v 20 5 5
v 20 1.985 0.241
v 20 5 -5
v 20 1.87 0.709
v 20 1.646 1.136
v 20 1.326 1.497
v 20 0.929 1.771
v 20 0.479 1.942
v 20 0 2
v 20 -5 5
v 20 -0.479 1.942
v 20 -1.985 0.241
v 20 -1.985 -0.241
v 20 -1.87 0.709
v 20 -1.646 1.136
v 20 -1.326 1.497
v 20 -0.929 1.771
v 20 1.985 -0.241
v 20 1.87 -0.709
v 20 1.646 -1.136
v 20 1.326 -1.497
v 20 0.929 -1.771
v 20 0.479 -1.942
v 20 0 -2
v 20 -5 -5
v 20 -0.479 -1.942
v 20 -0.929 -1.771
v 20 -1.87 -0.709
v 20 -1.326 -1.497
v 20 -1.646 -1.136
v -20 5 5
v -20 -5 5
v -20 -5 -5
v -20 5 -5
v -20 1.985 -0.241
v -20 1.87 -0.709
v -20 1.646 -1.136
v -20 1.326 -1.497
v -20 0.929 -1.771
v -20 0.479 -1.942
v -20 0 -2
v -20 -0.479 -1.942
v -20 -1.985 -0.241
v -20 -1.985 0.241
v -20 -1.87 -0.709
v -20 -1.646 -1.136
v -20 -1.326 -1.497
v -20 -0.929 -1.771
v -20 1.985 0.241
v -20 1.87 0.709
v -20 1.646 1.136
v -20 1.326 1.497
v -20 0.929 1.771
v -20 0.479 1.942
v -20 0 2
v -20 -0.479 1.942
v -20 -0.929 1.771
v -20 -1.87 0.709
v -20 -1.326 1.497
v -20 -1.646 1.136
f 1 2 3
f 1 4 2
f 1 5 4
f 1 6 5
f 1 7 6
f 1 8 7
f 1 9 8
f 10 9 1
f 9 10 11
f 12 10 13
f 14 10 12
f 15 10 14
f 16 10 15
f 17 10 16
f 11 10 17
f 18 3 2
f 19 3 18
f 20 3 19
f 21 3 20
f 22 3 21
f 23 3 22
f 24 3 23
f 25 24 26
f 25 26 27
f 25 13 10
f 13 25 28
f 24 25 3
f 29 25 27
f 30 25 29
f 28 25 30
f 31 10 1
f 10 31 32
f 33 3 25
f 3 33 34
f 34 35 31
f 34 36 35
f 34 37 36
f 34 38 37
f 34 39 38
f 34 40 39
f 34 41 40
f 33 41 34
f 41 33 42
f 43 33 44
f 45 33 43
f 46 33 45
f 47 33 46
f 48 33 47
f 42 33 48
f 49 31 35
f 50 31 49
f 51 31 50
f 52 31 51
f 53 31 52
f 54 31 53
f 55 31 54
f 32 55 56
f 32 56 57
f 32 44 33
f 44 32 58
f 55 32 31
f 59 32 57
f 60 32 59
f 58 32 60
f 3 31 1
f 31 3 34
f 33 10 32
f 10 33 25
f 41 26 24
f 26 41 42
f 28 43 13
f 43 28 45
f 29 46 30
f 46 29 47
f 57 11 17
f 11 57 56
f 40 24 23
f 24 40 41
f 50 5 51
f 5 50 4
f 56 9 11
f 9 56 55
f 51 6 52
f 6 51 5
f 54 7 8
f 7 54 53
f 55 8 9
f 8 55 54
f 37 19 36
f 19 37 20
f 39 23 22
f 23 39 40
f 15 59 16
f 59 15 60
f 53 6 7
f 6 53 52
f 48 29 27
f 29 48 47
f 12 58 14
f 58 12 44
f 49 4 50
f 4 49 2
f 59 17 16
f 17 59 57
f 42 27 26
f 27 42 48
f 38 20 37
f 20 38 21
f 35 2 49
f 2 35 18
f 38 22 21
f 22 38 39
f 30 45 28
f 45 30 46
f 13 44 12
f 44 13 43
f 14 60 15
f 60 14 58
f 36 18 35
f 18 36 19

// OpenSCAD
THICKNESS = 2;

NUT_WIDTH = 6;

NUT_INSET = 5;

TOTAL_LENGTH = 40;

SCREW_DIA = 4;

$fs = 0.5;


difference() {
    cube([TOTAL_LENGTH, NUT_WIDTH + THICKNESS * 2, NUT_WIDTH + THICKNESS * 2], center=true);
    rotate([0, 90, 0]) translate([0, 0, -TOTAL_LENGTH/2]) #cylinder(d=SCREW_DIA, h=TOTAL_LENGTH);
} 
